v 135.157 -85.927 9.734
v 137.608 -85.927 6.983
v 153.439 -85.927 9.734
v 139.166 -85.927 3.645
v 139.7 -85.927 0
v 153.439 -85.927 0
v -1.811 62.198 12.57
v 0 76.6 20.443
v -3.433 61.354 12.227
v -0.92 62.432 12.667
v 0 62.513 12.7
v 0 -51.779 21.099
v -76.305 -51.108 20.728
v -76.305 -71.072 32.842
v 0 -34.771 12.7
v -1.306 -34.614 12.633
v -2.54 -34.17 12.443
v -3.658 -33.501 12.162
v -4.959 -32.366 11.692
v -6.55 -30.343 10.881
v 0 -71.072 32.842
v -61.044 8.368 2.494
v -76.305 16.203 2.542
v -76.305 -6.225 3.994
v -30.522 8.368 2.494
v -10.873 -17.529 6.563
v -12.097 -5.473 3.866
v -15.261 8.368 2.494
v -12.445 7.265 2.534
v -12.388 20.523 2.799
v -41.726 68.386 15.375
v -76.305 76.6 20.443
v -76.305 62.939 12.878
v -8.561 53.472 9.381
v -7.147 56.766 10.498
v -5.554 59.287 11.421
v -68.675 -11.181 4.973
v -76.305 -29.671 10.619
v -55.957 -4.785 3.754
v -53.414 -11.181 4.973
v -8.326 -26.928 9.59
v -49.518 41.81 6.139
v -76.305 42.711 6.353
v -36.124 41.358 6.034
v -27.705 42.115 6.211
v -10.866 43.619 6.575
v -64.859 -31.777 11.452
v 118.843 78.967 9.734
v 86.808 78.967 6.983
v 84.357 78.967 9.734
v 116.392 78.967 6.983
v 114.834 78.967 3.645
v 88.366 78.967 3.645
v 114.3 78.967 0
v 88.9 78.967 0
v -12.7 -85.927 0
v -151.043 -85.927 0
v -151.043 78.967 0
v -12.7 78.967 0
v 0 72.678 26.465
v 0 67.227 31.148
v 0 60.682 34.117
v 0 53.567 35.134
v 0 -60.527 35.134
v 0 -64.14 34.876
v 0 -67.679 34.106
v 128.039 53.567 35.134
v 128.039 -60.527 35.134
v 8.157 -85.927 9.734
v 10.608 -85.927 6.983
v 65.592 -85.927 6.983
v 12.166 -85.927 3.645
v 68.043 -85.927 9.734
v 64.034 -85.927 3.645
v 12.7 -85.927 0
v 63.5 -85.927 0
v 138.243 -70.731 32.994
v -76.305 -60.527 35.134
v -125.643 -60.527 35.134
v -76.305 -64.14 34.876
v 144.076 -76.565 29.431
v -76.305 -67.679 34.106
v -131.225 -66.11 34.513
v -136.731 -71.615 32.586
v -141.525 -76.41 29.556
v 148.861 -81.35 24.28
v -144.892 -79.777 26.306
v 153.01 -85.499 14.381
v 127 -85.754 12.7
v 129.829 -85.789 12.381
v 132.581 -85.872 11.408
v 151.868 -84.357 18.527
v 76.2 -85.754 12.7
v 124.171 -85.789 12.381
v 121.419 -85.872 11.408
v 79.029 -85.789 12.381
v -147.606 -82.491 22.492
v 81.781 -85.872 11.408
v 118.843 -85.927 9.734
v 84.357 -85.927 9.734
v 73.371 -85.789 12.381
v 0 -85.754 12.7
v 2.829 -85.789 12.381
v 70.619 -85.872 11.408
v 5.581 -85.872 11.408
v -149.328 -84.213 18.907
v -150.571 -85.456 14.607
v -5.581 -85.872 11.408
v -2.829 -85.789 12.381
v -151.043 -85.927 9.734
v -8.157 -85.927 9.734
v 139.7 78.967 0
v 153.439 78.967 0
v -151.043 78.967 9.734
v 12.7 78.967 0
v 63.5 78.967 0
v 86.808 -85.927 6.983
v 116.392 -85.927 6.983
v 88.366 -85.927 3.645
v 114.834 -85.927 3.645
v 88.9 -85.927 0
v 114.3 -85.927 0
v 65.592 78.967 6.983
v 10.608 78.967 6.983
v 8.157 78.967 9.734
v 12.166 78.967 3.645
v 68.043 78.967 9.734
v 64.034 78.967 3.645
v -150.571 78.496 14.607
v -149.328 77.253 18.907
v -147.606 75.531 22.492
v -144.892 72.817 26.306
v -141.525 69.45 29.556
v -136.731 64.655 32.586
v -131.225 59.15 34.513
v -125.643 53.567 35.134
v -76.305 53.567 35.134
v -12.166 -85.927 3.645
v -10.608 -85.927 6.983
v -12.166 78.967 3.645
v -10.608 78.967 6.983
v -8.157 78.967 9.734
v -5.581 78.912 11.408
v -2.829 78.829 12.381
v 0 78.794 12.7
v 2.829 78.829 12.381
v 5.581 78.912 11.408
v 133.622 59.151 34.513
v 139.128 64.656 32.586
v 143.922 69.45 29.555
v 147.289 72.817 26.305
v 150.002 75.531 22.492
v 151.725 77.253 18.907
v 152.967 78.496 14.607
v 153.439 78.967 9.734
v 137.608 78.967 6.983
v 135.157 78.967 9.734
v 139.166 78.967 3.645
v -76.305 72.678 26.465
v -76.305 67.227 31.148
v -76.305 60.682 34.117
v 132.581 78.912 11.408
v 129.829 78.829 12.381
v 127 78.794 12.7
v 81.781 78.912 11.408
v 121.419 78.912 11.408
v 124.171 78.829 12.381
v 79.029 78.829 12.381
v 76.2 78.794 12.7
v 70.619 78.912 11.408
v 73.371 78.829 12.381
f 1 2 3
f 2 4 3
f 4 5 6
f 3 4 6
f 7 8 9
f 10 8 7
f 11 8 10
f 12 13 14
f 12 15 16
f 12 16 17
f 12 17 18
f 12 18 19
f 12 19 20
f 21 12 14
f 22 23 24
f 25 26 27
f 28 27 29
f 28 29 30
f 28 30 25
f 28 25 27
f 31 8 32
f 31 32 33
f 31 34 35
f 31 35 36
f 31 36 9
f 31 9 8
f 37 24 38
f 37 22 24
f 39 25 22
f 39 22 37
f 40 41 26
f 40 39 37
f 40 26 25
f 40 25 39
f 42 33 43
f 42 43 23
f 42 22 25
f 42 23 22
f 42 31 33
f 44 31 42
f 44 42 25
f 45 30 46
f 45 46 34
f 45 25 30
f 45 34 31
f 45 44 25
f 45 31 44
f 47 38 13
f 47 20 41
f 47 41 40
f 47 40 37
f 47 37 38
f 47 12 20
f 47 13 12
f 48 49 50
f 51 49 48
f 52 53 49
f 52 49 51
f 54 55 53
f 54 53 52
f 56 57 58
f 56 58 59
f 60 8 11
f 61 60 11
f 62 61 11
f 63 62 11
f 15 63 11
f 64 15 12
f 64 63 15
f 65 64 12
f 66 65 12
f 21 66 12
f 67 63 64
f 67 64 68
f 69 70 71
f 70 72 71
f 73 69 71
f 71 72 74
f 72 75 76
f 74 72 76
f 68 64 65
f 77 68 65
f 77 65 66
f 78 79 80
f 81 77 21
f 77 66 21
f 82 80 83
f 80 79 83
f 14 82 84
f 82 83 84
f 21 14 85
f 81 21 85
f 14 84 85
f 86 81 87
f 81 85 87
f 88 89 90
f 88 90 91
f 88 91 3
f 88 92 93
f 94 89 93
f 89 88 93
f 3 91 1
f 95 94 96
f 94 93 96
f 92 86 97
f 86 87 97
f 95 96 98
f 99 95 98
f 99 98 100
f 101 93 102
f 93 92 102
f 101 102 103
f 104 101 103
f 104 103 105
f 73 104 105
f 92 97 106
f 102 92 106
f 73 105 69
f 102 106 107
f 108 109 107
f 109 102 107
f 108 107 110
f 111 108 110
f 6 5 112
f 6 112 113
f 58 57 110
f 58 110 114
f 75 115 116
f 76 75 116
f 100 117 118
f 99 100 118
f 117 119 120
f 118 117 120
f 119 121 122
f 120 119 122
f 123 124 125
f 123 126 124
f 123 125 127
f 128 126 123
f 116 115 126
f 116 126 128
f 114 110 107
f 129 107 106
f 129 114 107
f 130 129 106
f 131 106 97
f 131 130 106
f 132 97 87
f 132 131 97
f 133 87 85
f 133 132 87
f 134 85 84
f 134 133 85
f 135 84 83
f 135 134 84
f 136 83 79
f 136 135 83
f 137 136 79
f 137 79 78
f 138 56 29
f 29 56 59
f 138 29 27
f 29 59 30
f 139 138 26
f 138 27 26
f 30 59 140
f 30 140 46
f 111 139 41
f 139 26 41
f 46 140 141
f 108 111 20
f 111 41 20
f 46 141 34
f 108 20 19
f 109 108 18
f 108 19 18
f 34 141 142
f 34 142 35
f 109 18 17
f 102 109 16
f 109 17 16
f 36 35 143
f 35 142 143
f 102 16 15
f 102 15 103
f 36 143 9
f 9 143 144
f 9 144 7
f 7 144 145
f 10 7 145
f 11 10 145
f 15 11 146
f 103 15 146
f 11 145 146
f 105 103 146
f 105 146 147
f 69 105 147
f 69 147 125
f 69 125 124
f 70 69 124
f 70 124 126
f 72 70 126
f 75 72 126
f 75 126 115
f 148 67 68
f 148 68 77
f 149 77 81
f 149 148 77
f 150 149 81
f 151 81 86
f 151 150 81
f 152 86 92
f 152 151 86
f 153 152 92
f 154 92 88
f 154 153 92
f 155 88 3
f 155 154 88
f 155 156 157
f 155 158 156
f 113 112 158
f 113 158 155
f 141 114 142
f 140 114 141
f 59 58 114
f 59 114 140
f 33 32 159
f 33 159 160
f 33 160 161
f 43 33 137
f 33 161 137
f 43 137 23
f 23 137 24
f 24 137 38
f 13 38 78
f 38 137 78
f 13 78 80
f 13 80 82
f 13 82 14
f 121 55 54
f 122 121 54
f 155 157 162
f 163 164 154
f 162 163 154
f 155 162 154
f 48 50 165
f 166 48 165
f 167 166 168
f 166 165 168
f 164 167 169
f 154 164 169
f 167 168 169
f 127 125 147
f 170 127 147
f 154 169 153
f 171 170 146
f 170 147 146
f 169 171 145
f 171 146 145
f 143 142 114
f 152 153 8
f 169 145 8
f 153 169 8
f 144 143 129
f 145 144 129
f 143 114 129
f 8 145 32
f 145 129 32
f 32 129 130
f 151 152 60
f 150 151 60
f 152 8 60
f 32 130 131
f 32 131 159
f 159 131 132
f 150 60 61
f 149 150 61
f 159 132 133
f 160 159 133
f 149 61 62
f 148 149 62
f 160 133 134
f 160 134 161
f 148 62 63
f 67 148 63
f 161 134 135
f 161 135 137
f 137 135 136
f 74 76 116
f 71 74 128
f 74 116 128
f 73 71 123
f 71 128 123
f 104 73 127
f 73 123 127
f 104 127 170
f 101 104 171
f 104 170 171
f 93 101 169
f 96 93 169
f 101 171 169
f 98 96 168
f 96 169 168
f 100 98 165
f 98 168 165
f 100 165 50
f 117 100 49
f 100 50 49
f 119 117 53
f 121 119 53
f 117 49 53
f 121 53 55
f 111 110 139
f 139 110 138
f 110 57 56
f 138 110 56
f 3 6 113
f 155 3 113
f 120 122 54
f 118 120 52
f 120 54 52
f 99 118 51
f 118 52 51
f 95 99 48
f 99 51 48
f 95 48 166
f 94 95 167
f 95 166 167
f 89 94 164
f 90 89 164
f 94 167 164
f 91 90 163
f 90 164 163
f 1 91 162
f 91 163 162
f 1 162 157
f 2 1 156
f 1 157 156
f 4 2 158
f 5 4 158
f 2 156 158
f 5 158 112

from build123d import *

# Parameters (mm, degrees)
F0_W        = 304.4815510511
F0_H        = 164.8949235678
F1_DEPTH    = 35.13393
F3_DEPTH    = 76.30524
F4_R        = 12.7
F5_DEPTH    = 164.8959236678
F6_T1_DEPTH = 291.8949235678
F6_T3_DEPTH = 431.4815510511


# Not quite as in the source:
# - a fillet or chamfer that OpenCascade refuses, or shapes differently, is made with other operations: its cross-section is extruded or revolved along the edge and cut away or added


with BuildPart() as f1:
    # F0 (on Top) → F1 (new body)
    with BuildSketch(Plane.XY):
        with Locations((1.1980161071, -3.480002284)):
            Rectangle(F0_W, F0_H)
    extrude(amount=F1_DEPTH)

    # F2 (on Right) → F3 (cut)
    with BuildSketch(Plane.YZ):
        with BuildLine():
            add(Edge.make_bspline(
                [(-153.2041430473, 84.2628479004), (-91.991528101, 80.6964321278), (-18.1249389438, 101.4390649478), (-6.3535316821, 35.464664407), (123.7363166686, 35.8483556733), (-7.6536515228, -20.5708818303), (-72.9342844873, 34.9796073045), (-103.3804491162, 54.5991994441)],
                knots=[0, 0, 0, 0, 0.2418010288, 0.3897431708, 0.5754176067, 0.7622533627, 1, 1, 1, 1], degree=3))
            add(Edge.make_bspline(
                [(-153.2041430473, 84.2628479004), (-136.2230330706, 76.9635861119), (-120.361559093, 61.8984612326), (-103.3804491162, 54.5991994441)],
                knots=[0, 0, 0, 0, 57.985623362, 57.985623362, 57.985623362, 57.985623362], degree=3))
        make_face()
    extrude(amount=-F3_DEPTH, mode=Mode.SUBTRACT)

    # F4 (on face) → F5 (cut, through all)
    with BuildSketch(Plane(origin=(0, 78.9674594998, 0), x_dir=(-1, 0, 0), z_dir=(0, 1, 0))):
        with Locations((-127, 0)):
            Circle(F4_R)
        with Locations((-76.2, 0)):
            Circle(F4_R)
        Circle(F4_R)
    extrude(amount=-F5_DEPTH, mode=Mode.SUBTRACT)

    # F6: fillet of radius 25.4 on 4 edges, made by hand

    # F6_s2 → F6_t1 (cut)
    with BuildSketch(Plane.XZ.offset(-142.4674594998)):
        with BuildLine():
            ThreePointArc((128.0387916327, 35.13393), (145.9993038748, 27.6944422421), (153.4387916327, 9.73393))
            Line((153.4387916327, 9.73393), (153.4387916327, 35.13393))
            Line((153.4387916327, 35.13393), (128.0387916327, 35.13393))
        make_face()
        with BuildLine():
            ThreePointArc((-151.0427594185, 9.73393), (-143.6032716606, 27.6944422421), (-125.6427594185, 35.13393))
            Line((-125.6427594185, 35.13393), (-151.0427594185, 35.13393))
            Line((-151.0427594185, 35.13393), (-151.0427594185, 9.73393))
        make_face()
    extrude(amount=F6_T1_DEPTH, mode=Mode.SUBTRACT)

    # F6_s4 → F6_t3 (cut)
    with BuildSketch(Plane.YZ.offset(-214.5427594185)):
        with BuildLine():
            ThreePointArc((78.9674594998, 9.73393), (71.527971742, 27.6944422421), (53.5674594998, 35.13393))
            Line((53.5674594998, 35.13393), (78.9674594998, 35.13393))
            Line((78.9674594998, 35.13393), (78.9674594998, 9.73393))
        make_face()
        with BuildLine():
            ThreePointArc((-60.5274640679, 35.13393), (-78.4879763101, 27.6944422421), (-85.9274640679, 9.73393))
            Line((-85.9274640679, 9.73393), (-85.9274640679, 35.13393))
            Line((-85.9274640679, 35.13393), (-60.5274640679, 35.13393))
        make_face()
    extrude(amount=F6_T3_DEPTH, mode=Mode.SUBTRACT)


solid = f1.part
